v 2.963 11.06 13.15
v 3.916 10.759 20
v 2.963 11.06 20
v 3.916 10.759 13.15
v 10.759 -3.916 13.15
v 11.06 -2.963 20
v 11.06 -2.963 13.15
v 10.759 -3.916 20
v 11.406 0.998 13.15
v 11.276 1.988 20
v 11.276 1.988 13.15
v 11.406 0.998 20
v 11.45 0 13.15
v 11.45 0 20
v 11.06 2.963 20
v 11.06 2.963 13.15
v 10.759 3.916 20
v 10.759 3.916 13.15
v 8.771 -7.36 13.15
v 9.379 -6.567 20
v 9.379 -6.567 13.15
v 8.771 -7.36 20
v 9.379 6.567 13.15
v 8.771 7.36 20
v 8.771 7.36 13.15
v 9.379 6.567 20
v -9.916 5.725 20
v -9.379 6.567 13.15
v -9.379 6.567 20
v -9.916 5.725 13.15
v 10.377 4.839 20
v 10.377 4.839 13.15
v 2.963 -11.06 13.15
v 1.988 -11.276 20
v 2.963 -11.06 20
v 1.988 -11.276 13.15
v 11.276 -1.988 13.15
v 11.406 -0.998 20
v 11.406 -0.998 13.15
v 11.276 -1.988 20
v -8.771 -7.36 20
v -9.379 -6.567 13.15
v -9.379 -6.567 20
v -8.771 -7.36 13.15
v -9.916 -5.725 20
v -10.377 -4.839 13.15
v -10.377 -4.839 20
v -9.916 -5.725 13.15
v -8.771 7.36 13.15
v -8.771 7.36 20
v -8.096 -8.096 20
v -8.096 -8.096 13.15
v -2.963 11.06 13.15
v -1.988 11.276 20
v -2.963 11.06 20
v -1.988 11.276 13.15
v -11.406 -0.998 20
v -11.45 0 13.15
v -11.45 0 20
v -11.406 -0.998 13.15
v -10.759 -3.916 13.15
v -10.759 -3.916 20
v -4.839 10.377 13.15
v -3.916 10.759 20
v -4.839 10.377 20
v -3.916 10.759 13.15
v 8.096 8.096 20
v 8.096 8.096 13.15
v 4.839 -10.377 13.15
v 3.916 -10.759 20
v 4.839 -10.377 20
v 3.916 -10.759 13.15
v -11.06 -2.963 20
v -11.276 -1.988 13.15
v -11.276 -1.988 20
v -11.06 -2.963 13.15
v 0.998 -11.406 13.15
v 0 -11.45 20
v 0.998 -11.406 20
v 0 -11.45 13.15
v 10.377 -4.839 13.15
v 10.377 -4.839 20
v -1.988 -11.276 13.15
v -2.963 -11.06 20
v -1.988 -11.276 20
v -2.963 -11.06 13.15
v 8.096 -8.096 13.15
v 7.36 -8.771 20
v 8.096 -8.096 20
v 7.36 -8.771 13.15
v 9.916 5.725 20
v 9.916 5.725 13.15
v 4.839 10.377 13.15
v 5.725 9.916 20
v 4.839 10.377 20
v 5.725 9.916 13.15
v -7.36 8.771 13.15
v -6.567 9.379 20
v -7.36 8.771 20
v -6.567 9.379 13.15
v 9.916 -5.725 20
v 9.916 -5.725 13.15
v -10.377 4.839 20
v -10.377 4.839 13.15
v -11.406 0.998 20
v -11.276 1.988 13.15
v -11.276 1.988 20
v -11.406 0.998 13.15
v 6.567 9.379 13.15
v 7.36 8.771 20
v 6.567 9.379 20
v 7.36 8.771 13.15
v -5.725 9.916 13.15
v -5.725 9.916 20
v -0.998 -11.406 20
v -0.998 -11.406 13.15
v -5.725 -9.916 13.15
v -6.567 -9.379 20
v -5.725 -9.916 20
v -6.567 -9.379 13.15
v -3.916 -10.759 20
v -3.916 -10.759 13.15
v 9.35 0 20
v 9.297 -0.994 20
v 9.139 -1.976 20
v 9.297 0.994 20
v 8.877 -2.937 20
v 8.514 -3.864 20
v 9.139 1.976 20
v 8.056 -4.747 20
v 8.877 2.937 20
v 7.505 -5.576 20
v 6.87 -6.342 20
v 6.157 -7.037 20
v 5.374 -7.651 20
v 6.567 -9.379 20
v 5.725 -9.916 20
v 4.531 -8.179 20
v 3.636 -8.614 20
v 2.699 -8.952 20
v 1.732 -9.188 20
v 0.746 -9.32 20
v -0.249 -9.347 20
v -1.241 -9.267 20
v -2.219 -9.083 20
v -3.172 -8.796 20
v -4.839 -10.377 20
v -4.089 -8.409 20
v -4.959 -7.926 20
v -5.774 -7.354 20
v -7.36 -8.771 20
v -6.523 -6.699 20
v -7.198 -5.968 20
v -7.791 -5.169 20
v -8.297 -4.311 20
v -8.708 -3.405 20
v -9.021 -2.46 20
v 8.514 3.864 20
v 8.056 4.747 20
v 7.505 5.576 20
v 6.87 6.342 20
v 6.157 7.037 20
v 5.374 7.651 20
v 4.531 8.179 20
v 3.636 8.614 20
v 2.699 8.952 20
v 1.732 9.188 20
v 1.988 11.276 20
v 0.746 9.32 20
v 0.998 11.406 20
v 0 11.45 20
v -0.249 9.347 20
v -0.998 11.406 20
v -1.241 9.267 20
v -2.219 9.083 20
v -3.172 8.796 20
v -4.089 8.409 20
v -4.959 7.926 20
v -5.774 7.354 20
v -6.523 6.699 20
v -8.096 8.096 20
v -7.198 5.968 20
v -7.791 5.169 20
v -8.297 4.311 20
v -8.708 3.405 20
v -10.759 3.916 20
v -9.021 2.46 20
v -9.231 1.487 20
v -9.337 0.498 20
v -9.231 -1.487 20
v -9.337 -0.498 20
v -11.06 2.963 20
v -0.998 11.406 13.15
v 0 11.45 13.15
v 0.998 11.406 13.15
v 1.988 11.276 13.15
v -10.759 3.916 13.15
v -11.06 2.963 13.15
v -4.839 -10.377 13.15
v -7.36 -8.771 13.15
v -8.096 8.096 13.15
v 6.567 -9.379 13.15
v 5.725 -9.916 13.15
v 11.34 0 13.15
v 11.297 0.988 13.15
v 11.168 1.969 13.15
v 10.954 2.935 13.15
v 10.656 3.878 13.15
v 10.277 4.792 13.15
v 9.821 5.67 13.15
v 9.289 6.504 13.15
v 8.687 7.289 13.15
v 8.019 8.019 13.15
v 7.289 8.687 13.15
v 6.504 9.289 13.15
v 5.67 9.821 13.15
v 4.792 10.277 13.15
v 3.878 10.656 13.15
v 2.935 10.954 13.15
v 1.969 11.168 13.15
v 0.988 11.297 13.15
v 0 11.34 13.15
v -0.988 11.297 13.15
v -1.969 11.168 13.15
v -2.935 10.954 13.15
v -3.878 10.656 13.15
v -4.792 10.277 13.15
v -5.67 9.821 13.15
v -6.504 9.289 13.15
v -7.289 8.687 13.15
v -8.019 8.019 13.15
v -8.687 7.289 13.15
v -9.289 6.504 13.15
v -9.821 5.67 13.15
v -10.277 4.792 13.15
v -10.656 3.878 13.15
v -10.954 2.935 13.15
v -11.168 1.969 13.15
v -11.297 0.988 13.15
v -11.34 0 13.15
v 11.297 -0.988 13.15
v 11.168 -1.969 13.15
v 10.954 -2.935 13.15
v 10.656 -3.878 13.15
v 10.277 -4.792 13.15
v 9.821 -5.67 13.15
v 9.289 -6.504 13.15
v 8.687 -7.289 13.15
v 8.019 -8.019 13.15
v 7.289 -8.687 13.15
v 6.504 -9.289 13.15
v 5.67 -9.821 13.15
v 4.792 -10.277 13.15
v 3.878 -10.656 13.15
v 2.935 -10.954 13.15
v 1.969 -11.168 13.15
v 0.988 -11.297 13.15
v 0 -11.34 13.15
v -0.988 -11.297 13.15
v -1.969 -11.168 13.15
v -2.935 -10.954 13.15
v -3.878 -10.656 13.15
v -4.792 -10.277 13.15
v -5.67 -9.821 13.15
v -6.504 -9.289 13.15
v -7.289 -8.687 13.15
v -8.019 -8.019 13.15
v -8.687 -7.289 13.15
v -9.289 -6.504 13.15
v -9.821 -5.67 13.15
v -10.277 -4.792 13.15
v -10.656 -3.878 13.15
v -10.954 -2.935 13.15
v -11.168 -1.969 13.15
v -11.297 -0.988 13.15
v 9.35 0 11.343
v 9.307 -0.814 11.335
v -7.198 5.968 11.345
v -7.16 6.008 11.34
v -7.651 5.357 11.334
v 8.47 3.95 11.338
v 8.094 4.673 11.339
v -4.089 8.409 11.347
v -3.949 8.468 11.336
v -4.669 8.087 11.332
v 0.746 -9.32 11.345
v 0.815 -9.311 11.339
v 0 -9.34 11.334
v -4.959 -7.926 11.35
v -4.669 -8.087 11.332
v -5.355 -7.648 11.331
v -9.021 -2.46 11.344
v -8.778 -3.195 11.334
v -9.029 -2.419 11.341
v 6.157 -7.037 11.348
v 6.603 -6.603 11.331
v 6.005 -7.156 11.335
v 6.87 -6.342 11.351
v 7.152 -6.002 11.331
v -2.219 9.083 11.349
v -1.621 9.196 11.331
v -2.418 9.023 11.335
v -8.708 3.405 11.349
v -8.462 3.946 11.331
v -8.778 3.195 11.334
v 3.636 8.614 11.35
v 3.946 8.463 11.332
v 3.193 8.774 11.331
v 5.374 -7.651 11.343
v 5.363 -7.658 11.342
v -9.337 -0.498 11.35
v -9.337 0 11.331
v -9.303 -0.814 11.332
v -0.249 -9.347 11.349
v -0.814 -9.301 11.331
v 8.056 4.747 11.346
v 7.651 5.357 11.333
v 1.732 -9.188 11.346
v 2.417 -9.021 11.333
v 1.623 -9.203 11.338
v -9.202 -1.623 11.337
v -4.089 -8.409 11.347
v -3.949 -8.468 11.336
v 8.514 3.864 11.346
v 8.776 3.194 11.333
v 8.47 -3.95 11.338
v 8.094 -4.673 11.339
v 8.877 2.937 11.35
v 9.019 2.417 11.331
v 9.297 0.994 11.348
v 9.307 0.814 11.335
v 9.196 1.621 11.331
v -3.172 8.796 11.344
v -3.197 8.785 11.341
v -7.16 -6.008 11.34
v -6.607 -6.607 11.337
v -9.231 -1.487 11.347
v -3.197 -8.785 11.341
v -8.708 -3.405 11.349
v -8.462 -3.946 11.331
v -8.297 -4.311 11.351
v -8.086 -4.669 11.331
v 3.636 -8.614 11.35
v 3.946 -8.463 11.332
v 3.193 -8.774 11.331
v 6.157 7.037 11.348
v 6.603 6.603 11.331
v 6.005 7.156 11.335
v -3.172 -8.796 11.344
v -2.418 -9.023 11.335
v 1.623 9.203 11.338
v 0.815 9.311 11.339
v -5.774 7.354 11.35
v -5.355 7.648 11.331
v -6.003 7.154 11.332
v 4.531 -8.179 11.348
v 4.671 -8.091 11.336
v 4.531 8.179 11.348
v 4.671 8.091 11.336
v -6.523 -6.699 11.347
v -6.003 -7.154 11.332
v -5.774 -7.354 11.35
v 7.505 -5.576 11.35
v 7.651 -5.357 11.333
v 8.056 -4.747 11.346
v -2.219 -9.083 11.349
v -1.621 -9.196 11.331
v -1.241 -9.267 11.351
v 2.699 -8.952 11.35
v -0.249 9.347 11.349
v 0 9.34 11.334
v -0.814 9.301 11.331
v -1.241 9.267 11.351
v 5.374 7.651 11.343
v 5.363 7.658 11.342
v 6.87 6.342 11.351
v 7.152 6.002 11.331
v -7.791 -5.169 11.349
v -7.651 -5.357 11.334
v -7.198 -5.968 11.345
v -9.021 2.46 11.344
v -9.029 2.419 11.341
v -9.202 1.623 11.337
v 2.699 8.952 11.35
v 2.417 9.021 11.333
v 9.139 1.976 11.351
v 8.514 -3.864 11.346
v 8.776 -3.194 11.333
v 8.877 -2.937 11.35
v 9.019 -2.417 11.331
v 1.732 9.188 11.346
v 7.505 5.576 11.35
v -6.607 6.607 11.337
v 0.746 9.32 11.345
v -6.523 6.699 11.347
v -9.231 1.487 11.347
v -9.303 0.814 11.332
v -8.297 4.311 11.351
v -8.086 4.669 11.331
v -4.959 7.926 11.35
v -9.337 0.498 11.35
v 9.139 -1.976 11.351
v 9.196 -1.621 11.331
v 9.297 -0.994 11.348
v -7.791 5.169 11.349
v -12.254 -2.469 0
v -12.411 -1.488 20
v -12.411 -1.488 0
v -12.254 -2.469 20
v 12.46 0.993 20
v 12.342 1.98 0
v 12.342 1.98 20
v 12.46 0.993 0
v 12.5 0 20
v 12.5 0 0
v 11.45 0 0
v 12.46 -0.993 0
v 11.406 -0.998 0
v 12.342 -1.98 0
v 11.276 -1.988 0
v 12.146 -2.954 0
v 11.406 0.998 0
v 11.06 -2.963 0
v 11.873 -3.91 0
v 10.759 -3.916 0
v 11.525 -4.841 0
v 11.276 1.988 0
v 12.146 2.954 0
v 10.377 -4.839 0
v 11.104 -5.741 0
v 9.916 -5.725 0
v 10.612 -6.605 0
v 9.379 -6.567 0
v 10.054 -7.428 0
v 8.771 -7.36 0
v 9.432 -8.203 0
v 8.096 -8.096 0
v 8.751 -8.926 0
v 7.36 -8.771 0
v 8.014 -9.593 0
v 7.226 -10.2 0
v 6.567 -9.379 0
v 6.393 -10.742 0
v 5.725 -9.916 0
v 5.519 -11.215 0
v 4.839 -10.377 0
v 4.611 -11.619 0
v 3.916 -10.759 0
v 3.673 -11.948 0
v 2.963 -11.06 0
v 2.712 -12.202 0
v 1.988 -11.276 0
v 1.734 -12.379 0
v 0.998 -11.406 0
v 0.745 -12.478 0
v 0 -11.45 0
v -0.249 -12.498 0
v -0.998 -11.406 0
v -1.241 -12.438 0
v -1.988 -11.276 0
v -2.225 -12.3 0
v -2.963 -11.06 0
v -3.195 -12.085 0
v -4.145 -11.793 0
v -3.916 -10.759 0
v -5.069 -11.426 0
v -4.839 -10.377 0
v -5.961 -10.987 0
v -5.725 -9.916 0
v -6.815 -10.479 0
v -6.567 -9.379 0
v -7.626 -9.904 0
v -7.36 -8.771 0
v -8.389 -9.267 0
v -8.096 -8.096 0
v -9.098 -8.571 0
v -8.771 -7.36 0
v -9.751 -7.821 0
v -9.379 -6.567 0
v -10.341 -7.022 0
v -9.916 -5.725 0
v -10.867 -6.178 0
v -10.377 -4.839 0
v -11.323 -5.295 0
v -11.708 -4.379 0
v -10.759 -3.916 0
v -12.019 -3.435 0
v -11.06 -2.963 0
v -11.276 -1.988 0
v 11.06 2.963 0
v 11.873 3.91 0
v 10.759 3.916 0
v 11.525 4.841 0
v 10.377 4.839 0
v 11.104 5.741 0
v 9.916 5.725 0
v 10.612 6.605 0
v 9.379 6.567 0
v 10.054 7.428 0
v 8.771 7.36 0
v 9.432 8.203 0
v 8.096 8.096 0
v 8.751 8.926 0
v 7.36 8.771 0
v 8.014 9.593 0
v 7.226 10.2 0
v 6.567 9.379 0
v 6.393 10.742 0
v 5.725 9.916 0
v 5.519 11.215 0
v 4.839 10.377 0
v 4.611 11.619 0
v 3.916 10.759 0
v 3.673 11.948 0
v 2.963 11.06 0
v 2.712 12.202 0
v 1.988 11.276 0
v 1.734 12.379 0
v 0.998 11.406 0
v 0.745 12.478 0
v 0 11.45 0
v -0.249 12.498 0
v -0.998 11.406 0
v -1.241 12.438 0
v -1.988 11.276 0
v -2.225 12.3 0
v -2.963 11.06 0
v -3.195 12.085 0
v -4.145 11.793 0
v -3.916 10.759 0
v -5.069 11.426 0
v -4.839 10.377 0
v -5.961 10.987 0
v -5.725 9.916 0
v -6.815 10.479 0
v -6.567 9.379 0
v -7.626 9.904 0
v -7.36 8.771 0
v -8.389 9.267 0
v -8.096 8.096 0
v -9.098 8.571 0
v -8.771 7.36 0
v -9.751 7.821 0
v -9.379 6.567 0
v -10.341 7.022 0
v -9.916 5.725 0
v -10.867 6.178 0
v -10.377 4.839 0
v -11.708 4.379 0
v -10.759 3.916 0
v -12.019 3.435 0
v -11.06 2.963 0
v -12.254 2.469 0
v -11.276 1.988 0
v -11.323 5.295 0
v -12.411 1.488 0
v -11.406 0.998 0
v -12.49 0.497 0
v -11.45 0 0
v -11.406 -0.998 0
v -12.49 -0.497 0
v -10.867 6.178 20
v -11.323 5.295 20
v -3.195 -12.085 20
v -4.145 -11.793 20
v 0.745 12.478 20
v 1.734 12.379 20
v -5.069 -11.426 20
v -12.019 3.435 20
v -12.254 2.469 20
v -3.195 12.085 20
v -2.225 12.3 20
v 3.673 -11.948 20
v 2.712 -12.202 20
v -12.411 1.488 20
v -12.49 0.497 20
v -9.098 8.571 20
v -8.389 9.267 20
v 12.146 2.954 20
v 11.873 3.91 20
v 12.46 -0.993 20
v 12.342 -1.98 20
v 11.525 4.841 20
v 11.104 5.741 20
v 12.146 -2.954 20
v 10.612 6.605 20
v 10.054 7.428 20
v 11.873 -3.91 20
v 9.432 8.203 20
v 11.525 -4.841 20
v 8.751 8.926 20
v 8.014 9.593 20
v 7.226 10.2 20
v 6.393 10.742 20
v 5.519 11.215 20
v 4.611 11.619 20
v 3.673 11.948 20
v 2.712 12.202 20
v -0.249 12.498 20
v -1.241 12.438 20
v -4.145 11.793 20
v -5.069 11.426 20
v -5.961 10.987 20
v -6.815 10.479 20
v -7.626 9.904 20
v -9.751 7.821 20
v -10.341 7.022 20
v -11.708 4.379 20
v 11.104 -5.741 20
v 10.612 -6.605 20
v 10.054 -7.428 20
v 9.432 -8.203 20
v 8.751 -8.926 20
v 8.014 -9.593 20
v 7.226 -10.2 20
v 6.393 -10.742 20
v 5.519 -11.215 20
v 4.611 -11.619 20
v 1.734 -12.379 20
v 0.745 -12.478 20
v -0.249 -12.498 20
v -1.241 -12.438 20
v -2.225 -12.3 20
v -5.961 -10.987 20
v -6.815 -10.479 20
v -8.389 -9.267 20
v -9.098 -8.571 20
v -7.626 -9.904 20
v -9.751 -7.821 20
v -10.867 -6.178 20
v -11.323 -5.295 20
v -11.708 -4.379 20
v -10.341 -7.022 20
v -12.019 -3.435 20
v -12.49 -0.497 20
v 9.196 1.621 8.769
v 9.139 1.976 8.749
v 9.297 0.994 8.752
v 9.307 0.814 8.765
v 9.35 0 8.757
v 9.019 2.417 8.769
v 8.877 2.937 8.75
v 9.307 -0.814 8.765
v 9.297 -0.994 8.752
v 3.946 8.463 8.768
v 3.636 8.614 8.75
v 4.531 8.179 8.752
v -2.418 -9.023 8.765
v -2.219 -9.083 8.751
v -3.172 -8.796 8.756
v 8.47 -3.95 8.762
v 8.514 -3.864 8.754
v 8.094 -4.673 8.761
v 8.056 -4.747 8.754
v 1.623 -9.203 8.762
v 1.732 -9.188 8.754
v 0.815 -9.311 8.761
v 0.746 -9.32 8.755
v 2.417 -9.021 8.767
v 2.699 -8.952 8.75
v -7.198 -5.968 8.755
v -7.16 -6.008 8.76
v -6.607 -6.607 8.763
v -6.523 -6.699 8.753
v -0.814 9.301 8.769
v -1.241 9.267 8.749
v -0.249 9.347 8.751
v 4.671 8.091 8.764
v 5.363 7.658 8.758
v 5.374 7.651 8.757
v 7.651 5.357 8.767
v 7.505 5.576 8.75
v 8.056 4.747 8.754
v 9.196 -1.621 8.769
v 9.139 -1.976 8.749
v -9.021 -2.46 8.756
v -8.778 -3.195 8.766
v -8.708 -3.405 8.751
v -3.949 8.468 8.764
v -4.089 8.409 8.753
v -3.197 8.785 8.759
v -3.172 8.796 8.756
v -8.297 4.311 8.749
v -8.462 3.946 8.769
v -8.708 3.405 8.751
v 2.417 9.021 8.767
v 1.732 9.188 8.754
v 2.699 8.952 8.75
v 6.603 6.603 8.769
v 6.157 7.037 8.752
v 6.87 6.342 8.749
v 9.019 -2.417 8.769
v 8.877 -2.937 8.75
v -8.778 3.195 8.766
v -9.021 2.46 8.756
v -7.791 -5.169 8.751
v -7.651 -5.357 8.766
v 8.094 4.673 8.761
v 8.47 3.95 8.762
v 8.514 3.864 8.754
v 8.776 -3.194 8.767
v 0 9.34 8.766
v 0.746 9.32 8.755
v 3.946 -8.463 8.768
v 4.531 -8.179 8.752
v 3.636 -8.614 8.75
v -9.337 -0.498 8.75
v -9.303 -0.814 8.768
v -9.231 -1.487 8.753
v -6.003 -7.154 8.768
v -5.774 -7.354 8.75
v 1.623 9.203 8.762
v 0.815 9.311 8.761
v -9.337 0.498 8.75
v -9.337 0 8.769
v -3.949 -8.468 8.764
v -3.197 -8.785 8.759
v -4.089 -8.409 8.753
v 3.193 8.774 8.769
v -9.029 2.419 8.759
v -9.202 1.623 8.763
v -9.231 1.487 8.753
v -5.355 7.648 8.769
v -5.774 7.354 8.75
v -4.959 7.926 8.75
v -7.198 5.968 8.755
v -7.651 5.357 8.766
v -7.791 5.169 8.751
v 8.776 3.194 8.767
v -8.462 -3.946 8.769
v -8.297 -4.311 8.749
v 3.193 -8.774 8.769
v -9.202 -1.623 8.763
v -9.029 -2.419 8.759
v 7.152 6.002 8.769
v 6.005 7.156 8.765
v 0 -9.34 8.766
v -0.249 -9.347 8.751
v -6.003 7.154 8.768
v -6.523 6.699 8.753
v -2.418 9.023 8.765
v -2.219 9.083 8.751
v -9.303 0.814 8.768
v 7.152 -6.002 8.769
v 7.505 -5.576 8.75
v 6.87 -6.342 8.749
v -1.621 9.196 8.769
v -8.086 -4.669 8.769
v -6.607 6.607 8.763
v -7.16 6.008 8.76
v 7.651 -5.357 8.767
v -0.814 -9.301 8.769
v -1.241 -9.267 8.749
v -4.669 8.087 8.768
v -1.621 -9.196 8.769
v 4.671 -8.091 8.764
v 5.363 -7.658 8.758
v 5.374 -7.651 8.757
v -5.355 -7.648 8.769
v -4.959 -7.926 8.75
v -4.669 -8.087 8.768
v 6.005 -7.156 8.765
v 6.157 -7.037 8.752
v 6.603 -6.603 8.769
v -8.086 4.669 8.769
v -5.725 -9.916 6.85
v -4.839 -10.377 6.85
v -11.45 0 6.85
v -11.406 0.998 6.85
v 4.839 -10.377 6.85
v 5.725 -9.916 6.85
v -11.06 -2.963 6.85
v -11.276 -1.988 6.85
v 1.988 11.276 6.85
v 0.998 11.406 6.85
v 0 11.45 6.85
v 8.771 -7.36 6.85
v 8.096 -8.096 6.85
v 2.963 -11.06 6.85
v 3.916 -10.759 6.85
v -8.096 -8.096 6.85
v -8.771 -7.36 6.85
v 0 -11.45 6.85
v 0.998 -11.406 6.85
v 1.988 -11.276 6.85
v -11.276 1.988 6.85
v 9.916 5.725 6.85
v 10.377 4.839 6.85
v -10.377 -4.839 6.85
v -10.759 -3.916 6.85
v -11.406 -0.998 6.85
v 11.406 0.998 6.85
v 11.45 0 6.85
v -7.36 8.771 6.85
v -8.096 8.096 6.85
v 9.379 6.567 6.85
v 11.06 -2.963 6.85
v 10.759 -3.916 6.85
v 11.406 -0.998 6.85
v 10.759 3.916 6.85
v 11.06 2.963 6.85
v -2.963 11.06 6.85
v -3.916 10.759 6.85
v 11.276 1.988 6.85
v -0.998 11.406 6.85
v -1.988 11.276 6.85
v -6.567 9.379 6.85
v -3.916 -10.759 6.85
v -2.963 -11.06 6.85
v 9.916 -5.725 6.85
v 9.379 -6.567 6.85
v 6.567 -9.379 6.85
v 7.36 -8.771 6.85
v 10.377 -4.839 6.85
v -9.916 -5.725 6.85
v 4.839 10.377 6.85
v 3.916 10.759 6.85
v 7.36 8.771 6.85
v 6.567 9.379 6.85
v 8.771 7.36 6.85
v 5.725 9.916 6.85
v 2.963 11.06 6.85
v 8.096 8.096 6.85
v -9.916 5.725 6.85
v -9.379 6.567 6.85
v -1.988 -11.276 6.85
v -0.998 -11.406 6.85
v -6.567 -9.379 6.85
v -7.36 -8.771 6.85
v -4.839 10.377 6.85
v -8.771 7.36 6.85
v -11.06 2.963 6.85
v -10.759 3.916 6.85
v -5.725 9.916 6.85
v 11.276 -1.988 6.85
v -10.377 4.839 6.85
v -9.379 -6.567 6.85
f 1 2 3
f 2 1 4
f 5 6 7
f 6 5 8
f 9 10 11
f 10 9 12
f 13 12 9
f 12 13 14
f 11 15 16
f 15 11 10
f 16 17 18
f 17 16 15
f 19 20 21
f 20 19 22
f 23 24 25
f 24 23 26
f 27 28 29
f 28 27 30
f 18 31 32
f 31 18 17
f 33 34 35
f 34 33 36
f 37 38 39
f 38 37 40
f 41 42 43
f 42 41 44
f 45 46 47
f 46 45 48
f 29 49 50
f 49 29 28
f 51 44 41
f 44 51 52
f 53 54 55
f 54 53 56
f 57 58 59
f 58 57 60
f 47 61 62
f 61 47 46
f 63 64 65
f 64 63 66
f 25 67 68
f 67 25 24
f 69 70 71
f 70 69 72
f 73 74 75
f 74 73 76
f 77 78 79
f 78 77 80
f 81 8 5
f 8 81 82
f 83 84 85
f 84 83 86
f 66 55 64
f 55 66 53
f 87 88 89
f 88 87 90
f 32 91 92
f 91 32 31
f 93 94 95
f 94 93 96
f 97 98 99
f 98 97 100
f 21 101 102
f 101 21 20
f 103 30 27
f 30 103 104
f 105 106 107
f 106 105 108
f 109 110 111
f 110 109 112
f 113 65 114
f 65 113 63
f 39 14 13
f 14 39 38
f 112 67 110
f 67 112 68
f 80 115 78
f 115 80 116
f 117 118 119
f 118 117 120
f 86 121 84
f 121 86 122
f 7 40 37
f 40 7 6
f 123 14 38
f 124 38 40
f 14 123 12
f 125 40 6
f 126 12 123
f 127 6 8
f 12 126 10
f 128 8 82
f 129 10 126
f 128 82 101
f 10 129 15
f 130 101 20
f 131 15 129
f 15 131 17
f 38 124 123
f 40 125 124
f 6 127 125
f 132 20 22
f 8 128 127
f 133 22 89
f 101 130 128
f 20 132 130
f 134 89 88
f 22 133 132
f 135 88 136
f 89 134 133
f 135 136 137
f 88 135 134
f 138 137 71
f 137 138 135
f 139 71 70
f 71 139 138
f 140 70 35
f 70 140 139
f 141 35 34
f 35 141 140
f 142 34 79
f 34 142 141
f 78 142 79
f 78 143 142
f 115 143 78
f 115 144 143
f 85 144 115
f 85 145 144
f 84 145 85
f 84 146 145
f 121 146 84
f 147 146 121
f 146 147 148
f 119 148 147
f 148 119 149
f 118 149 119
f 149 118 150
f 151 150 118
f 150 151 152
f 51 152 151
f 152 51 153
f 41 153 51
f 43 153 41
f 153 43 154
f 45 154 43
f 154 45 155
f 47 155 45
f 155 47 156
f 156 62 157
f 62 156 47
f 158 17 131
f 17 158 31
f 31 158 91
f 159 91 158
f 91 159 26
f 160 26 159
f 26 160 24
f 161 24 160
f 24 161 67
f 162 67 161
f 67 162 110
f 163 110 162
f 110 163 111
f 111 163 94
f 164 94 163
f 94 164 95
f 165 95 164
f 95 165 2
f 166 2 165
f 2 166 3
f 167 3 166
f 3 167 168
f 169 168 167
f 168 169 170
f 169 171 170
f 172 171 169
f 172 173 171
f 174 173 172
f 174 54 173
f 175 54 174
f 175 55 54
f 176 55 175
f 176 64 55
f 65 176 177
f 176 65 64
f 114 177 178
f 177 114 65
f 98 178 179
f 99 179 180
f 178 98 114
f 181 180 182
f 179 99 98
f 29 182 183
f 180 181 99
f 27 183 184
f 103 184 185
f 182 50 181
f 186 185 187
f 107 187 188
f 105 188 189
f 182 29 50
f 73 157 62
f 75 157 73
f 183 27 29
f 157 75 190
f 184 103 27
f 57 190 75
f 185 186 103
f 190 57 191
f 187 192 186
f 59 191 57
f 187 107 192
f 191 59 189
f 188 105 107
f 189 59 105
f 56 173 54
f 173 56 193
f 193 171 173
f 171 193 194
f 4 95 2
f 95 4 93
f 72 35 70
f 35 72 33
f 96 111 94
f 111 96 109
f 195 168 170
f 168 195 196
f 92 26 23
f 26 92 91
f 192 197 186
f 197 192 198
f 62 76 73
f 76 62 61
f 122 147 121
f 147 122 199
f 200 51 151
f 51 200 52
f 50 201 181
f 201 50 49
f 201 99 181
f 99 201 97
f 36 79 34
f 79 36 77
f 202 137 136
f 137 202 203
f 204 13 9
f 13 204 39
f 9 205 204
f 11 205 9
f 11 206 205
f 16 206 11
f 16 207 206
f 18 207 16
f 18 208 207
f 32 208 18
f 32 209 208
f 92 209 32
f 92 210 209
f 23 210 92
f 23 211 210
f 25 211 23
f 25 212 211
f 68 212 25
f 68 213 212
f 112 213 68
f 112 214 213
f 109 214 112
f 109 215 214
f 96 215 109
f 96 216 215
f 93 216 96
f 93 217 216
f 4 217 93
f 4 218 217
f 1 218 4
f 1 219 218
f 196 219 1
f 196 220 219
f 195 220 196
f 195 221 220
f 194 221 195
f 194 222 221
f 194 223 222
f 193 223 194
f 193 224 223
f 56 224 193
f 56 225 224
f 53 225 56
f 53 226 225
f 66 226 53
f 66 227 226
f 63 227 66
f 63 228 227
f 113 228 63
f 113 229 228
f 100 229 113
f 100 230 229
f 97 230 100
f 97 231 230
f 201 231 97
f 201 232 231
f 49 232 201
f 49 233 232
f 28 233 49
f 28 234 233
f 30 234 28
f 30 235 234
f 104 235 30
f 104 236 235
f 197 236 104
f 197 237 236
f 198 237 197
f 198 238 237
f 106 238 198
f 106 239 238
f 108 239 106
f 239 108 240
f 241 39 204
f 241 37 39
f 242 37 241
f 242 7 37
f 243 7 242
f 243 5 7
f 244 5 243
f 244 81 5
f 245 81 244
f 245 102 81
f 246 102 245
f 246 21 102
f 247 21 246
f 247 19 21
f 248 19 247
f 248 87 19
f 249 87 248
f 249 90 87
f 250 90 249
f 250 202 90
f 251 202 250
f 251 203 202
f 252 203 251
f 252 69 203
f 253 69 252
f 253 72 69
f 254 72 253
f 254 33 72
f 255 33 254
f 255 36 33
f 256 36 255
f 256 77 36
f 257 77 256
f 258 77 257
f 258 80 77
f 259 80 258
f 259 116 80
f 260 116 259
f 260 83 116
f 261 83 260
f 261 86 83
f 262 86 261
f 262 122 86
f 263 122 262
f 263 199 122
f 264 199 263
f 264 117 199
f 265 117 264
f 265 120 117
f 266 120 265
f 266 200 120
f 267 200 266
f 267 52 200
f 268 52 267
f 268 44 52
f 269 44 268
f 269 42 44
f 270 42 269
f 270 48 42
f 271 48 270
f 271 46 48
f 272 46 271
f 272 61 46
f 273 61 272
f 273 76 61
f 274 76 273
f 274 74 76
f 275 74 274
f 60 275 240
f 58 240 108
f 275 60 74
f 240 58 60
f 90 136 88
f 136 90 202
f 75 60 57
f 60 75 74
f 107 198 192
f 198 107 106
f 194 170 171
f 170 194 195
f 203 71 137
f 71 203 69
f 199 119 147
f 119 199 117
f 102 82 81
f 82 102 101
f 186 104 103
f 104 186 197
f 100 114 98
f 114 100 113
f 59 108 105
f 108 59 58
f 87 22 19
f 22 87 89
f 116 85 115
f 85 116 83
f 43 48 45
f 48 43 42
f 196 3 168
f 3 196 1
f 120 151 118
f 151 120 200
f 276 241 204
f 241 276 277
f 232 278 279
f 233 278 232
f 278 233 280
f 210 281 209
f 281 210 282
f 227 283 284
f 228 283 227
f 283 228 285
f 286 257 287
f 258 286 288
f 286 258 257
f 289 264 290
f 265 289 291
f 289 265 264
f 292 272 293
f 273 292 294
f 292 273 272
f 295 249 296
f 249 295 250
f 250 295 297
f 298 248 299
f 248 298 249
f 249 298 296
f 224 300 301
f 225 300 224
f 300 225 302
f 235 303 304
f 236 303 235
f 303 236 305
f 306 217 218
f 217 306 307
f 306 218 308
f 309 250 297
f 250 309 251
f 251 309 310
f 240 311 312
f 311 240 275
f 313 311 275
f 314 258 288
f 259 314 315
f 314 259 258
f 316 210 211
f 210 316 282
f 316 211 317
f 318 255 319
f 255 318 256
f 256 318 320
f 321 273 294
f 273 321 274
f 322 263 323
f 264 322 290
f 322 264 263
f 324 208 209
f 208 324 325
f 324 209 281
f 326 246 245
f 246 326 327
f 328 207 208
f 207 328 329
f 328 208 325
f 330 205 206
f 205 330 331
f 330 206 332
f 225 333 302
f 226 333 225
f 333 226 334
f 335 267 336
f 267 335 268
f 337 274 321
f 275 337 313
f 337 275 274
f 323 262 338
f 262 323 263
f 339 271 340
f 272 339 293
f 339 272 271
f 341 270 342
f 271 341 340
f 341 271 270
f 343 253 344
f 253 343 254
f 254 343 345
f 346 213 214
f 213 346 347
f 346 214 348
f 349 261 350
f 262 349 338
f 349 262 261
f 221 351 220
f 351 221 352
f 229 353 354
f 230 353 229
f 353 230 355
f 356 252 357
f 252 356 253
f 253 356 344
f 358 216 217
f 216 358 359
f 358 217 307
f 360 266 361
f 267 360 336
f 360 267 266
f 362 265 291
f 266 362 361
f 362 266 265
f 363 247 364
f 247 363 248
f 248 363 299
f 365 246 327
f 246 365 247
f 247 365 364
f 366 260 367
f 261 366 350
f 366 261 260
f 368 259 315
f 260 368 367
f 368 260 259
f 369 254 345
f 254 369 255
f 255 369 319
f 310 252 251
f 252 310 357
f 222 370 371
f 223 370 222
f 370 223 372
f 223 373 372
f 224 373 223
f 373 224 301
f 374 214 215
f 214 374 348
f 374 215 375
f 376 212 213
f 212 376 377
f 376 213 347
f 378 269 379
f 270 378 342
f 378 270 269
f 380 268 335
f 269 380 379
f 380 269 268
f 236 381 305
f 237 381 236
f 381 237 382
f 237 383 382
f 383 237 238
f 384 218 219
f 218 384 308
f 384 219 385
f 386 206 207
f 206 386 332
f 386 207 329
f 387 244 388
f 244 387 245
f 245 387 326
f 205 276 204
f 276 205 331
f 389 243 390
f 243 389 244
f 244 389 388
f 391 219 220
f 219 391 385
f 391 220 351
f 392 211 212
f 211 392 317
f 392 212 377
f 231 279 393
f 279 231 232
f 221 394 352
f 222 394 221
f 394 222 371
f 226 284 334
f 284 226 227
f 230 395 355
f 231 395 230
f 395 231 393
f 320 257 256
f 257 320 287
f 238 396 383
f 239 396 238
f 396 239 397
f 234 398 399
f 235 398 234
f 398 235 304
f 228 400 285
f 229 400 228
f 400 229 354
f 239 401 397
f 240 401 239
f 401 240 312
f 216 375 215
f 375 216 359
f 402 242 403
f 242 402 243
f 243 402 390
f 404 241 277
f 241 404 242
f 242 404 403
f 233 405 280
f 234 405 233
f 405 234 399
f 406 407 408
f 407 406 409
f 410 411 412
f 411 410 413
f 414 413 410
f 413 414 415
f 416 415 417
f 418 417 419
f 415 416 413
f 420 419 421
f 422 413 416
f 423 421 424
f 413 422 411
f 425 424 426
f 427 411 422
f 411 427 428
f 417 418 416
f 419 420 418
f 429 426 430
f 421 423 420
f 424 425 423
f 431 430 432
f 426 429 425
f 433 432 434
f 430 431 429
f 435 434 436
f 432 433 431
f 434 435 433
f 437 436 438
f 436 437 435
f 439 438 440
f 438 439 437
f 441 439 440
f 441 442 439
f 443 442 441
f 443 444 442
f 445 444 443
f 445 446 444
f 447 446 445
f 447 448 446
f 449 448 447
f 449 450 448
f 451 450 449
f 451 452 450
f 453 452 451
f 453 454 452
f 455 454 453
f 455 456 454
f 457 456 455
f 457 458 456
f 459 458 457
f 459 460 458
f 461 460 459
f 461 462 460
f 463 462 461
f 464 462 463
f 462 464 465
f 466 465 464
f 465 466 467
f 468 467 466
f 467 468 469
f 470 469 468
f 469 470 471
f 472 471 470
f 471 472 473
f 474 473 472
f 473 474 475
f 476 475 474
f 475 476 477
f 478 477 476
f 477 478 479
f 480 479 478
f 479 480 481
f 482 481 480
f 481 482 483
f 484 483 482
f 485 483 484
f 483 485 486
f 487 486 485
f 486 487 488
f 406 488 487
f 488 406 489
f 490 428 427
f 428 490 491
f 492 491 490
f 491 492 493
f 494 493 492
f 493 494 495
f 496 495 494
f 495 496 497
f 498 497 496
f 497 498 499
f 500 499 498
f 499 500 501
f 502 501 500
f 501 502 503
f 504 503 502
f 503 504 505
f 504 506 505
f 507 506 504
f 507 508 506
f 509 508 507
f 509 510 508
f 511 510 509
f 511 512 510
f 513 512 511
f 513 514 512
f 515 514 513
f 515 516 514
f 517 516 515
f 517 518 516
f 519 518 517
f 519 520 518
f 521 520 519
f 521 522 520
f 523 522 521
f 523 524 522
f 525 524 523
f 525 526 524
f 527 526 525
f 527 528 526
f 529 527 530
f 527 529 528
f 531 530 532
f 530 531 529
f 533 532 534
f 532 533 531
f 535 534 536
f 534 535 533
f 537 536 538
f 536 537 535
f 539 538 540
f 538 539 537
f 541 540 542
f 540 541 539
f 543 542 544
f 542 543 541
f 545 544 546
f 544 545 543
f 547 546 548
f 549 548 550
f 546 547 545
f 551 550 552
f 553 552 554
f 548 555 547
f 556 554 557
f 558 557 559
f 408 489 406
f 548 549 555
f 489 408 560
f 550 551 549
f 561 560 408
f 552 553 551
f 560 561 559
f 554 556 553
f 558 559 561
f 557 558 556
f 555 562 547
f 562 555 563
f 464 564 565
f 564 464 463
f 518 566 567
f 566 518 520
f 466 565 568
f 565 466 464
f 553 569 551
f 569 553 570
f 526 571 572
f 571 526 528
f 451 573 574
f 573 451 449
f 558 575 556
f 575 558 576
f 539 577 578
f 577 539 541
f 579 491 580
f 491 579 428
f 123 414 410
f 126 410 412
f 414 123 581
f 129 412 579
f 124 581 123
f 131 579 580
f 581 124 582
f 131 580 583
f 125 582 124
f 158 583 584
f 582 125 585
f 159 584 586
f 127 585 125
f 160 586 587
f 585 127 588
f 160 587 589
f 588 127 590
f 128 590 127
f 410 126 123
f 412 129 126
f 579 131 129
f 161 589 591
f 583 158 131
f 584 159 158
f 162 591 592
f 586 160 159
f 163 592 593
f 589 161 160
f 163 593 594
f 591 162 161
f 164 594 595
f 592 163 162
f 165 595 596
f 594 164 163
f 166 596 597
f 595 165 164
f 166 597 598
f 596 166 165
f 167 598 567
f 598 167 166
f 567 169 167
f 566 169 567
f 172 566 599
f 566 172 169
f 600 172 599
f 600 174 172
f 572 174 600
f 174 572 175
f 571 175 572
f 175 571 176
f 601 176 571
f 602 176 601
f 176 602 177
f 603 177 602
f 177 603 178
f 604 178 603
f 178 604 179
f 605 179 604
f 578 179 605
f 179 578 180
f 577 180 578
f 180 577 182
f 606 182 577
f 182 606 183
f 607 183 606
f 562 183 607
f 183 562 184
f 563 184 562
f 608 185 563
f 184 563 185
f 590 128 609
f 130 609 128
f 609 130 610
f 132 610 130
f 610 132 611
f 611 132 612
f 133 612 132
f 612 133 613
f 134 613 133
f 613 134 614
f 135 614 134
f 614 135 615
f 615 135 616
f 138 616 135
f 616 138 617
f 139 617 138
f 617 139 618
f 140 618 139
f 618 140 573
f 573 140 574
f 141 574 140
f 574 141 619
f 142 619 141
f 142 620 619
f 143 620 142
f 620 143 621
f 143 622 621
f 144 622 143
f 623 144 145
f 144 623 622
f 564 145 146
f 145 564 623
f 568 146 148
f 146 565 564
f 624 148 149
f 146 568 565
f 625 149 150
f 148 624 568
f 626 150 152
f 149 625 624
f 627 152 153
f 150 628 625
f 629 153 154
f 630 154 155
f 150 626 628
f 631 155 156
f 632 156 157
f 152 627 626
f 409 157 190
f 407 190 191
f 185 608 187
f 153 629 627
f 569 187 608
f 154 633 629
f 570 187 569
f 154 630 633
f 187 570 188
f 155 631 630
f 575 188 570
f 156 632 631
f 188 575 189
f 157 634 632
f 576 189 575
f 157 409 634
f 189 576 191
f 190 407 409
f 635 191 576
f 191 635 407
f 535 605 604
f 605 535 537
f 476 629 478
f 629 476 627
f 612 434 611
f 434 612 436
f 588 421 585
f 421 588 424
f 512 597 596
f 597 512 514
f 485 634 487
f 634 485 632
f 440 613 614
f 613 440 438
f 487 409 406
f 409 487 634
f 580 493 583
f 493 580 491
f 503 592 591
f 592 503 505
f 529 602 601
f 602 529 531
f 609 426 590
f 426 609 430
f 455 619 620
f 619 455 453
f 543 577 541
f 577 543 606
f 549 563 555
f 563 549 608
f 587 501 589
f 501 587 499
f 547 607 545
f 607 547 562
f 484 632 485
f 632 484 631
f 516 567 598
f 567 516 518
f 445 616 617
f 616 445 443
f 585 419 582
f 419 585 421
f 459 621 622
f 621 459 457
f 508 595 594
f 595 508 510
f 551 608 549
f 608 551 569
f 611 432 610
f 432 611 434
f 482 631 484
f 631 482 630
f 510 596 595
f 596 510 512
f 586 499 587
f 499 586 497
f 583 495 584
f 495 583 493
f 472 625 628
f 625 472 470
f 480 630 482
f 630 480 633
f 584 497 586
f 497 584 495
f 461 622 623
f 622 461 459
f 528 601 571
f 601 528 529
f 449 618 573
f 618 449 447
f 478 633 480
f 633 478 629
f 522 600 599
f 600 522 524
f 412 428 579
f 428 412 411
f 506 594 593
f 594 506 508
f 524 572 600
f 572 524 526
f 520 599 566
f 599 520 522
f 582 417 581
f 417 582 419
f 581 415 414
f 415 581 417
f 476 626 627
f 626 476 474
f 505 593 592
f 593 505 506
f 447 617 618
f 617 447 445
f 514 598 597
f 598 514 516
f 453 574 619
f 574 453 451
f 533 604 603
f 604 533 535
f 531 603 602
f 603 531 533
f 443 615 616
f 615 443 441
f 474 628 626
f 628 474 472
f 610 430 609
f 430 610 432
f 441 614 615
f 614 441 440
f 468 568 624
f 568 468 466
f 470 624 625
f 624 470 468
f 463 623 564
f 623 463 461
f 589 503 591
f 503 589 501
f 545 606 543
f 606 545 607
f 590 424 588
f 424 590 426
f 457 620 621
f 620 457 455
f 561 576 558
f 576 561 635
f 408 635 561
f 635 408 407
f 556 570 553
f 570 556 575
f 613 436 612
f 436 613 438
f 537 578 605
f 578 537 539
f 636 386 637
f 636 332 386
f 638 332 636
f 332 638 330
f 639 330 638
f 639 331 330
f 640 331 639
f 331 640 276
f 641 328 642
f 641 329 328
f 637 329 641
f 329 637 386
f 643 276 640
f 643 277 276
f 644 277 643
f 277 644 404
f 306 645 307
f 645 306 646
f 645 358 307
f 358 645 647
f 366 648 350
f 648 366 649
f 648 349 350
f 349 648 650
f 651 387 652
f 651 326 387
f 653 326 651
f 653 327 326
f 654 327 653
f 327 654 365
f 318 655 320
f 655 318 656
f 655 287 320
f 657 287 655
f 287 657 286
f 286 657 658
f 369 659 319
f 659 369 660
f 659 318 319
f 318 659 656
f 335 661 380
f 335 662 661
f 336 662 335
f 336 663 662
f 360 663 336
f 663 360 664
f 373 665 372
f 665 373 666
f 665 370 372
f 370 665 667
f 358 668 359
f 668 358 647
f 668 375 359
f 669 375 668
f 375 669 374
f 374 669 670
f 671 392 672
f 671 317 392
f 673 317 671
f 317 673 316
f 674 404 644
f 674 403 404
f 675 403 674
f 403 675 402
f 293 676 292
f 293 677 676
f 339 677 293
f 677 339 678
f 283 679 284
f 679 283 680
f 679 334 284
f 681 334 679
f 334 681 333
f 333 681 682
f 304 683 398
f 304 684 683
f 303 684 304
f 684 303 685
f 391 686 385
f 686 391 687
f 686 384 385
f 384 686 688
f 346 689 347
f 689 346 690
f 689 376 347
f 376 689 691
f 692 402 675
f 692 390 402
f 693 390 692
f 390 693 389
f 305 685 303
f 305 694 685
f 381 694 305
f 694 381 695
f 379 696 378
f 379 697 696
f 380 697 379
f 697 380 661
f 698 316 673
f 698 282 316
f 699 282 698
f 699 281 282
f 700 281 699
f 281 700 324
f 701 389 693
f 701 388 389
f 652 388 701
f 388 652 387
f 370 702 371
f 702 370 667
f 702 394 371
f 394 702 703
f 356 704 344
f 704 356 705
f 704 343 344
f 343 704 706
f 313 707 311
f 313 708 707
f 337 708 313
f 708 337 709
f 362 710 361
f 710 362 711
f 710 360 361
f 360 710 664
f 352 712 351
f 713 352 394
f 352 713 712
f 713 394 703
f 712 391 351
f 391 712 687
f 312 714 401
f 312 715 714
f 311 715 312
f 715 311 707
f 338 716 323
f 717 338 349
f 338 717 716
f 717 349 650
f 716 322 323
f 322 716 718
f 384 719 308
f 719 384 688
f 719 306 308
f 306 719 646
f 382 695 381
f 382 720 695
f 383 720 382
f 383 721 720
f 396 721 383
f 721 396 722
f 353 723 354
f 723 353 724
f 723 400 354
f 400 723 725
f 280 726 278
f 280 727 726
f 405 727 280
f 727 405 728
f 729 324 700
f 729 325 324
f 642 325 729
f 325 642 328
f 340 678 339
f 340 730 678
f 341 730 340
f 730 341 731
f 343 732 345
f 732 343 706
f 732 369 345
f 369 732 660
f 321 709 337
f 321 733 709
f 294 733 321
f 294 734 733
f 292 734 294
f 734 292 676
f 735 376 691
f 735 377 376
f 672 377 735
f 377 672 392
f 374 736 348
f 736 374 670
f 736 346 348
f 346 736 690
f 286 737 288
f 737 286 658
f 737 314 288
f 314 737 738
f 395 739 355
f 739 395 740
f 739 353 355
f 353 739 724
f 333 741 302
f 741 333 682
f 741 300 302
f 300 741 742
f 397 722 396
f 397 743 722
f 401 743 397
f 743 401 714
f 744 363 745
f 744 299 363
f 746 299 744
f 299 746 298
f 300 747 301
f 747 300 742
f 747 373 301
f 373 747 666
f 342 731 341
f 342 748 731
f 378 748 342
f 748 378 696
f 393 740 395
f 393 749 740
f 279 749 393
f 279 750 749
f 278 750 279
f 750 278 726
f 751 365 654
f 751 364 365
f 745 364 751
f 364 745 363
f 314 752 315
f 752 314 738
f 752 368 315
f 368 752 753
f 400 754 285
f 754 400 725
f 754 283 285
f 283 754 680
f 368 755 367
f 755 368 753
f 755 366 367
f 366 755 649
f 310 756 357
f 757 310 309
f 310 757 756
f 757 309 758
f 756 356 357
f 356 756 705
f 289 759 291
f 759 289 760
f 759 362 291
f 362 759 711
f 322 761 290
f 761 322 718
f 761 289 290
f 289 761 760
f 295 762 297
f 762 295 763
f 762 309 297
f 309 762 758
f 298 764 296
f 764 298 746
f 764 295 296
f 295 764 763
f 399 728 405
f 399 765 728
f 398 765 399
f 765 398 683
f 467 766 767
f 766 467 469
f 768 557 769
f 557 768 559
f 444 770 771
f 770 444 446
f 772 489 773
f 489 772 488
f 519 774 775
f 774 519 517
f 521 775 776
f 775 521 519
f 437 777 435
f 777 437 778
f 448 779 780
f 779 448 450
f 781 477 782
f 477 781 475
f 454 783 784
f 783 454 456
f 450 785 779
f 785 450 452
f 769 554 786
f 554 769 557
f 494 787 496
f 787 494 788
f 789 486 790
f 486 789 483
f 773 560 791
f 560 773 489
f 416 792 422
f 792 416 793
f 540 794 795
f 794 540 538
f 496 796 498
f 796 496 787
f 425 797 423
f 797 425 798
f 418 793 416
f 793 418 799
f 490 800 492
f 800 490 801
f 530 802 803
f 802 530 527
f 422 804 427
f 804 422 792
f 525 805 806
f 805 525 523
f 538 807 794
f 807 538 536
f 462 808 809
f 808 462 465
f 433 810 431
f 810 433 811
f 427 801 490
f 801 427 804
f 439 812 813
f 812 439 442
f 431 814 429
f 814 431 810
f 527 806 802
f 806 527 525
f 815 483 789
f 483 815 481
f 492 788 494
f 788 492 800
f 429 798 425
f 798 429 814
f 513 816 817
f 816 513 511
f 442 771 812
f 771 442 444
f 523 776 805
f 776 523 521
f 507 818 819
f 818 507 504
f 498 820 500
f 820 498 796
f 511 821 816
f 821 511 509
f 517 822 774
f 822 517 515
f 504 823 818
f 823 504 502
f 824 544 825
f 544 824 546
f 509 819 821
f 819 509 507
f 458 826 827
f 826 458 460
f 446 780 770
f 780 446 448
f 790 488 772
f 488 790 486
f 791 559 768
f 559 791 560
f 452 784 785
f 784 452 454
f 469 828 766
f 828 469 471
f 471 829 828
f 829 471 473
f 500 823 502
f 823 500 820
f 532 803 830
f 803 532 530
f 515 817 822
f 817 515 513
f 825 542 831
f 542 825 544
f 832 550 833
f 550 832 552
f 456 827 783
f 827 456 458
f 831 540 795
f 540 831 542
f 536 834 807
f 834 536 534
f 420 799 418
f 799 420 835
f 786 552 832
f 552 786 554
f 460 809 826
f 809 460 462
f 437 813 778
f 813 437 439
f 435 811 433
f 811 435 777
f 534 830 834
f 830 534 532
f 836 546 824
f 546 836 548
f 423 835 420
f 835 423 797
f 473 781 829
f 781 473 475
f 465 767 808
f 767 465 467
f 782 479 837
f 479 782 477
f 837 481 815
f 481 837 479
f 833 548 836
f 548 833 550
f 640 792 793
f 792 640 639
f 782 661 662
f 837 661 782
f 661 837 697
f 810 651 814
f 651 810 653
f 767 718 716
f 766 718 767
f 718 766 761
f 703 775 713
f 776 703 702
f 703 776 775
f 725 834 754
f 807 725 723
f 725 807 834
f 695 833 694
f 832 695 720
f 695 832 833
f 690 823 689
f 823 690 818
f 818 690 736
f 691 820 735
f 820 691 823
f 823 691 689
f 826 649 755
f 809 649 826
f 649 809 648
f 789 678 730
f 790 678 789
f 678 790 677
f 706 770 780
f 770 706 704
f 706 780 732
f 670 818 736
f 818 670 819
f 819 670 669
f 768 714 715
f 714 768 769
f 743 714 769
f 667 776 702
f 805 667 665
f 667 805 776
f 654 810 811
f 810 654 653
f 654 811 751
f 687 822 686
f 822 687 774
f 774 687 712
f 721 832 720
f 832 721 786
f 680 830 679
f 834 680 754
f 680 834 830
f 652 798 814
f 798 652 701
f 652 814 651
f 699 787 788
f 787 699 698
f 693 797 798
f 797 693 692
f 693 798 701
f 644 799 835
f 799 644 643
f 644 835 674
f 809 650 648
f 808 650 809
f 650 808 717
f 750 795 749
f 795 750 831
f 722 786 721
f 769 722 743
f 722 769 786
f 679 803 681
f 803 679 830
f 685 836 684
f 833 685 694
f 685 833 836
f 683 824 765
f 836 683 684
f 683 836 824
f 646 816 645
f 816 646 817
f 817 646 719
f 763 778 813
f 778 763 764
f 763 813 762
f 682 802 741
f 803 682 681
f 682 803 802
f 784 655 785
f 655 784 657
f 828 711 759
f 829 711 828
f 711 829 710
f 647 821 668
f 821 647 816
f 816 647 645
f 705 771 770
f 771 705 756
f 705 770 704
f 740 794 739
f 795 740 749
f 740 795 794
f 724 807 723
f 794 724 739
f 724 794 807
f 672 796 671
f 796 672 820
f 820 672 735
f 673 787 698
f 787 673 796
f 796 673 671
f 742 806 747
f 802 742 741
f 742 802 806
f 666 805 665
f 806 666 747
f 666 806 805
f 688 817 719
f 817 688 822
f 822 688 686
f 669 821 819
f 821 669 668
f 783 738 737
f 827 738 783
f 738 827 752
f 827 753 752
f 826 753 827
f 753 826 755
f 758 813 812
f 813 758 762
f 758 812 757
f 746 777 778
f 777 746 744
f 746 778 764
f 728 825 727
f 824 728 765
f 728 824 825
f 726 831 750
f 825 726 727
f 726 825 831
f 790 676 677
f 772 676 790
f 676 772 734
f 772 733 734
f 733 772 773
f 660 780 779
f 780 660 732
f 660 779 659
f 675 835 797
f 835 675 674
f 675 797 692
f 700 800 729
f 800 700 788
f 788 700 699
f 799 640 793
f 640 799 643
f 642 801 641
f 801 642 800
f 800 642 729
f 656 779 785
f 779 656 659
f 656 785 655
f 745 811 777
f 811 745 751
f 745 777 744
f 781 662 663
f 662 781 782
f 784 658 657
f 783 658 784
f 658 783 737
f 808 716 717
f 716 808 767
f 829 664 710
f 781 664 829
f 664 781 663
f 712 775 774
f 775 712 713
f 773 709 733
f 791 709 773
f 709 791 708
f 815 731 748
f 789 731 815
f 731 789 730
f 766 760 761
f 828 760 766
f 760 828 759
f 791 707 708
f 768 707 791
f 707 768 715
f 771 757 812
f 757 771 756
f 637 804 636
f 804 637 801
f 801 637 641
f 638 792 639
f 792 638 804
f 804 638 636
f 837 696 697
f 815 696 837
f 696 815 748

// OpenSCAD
// file: config.scad
/*
 * config
 *
 * Copyright 2013 <b@Zi.iS>
 * License CC BY 3.0
 */

$fa = 1;
$fs = 1;
preview = 1;

// preview colors
color_steal = [.8,.8,.8];
color_wood = [.3,.3,0];
color_print = [0,.8,0];

// metric bolt sizes
function m_hole(size) = size*1.1/2;
function m_pilot(size) = size*.9/2;

mounting_bolt = 3;

// slightly move and slightly elongate objects in preview to overcome scad rounding errors
module e() {
	if(preview==1) {
		translate([
			0,
			0,
			-.1
		]) {
			scale([
				1,
				1,
				1.1
			]) {
				child();
			}
		}
	} else {
		child();
	}
}

module m_washer(
	size = 3
) {
	color(color_steal) {
		difference() {
			cylinder(
				r = size/2*2,
				h = size*.2
			);
			e() cylinder(
				r = size/2,
				h = size*.2
			);
		}
	}
	translate([
		0,
		0,
		size*.2
	]) {
		child();
	}
}

module m_nut(
	size = 3
) {
	color(color_steal) {
		difference() {
			cylinder(
				r = size*1.8/2,
				h = size*.8,
				$fn = 6
			);
		}
	}
	translate([
		0,
		0,
		size*.8
	]) {
		child();
	}
}

module m_nylock(
	size = 3
) {
	color(color_steal) {
		difference() {
			cylinder(
				r = size*1.8/2,
				h = size,
				$fn = 6
			);
		}
	}
	translate([
		0,
		0,
		size
	]) {
		child();
	}
}

module screw(
	r = 1,
	h = 1,
	pitch = 5,
) {
	linear_extrude(
		height = h,
		twist = -h/pitch*360
	) {
		translate([pitch/5,0,0]) { //H=.2*p works better in plastic then ISO's H=.866*p
			circle(
				r=r 
			);
		}
	}
}

fan40 = [
	40,			//width/length
	10,			//height
	32,			//bolt pitch
	3,			//bolt
];

lm8uu = [
	15.2/2,	//outside
	8/2,	//inside
	26,		//length
];
// main file
/*
 * Woggle
 *
 * Copyright 2013 <b@Zi.iS>
 * License CC BY 3.0
 */

include <config.scad>
preview=0;

woggle();

module woggle(
	r = 25/2,
	h = 20,
	t = 1.05
) {
	difference() {
		cylinder(
			r = r,
			h = h
		);
		e() cylinder(
			r = r-t*3,
			h = h
		);
		e() cylinder(
			r = r-t,
			h = (h - t*6)/2
		);
		translate([
			0,
			0,
			(h - t*6)/2
		]) {
			cylinder(
				r1 = r-t,
				r2 = 0,
				h = r-t*2
			);
		}
		translate([
			0,
			0,
			(h + t*6)/2
		]) {
			e() cylinder(
				r = r-t,
				h = (h - t*6)/2
			);
			translate([0,0,+.1])
			rotate([
				180,
				0,
				0,
			]) {
				cylinder(
					r1 = r-t,
					r2 = 0,
					h = r-t*2
				);
			}
		}
	}

		
}
